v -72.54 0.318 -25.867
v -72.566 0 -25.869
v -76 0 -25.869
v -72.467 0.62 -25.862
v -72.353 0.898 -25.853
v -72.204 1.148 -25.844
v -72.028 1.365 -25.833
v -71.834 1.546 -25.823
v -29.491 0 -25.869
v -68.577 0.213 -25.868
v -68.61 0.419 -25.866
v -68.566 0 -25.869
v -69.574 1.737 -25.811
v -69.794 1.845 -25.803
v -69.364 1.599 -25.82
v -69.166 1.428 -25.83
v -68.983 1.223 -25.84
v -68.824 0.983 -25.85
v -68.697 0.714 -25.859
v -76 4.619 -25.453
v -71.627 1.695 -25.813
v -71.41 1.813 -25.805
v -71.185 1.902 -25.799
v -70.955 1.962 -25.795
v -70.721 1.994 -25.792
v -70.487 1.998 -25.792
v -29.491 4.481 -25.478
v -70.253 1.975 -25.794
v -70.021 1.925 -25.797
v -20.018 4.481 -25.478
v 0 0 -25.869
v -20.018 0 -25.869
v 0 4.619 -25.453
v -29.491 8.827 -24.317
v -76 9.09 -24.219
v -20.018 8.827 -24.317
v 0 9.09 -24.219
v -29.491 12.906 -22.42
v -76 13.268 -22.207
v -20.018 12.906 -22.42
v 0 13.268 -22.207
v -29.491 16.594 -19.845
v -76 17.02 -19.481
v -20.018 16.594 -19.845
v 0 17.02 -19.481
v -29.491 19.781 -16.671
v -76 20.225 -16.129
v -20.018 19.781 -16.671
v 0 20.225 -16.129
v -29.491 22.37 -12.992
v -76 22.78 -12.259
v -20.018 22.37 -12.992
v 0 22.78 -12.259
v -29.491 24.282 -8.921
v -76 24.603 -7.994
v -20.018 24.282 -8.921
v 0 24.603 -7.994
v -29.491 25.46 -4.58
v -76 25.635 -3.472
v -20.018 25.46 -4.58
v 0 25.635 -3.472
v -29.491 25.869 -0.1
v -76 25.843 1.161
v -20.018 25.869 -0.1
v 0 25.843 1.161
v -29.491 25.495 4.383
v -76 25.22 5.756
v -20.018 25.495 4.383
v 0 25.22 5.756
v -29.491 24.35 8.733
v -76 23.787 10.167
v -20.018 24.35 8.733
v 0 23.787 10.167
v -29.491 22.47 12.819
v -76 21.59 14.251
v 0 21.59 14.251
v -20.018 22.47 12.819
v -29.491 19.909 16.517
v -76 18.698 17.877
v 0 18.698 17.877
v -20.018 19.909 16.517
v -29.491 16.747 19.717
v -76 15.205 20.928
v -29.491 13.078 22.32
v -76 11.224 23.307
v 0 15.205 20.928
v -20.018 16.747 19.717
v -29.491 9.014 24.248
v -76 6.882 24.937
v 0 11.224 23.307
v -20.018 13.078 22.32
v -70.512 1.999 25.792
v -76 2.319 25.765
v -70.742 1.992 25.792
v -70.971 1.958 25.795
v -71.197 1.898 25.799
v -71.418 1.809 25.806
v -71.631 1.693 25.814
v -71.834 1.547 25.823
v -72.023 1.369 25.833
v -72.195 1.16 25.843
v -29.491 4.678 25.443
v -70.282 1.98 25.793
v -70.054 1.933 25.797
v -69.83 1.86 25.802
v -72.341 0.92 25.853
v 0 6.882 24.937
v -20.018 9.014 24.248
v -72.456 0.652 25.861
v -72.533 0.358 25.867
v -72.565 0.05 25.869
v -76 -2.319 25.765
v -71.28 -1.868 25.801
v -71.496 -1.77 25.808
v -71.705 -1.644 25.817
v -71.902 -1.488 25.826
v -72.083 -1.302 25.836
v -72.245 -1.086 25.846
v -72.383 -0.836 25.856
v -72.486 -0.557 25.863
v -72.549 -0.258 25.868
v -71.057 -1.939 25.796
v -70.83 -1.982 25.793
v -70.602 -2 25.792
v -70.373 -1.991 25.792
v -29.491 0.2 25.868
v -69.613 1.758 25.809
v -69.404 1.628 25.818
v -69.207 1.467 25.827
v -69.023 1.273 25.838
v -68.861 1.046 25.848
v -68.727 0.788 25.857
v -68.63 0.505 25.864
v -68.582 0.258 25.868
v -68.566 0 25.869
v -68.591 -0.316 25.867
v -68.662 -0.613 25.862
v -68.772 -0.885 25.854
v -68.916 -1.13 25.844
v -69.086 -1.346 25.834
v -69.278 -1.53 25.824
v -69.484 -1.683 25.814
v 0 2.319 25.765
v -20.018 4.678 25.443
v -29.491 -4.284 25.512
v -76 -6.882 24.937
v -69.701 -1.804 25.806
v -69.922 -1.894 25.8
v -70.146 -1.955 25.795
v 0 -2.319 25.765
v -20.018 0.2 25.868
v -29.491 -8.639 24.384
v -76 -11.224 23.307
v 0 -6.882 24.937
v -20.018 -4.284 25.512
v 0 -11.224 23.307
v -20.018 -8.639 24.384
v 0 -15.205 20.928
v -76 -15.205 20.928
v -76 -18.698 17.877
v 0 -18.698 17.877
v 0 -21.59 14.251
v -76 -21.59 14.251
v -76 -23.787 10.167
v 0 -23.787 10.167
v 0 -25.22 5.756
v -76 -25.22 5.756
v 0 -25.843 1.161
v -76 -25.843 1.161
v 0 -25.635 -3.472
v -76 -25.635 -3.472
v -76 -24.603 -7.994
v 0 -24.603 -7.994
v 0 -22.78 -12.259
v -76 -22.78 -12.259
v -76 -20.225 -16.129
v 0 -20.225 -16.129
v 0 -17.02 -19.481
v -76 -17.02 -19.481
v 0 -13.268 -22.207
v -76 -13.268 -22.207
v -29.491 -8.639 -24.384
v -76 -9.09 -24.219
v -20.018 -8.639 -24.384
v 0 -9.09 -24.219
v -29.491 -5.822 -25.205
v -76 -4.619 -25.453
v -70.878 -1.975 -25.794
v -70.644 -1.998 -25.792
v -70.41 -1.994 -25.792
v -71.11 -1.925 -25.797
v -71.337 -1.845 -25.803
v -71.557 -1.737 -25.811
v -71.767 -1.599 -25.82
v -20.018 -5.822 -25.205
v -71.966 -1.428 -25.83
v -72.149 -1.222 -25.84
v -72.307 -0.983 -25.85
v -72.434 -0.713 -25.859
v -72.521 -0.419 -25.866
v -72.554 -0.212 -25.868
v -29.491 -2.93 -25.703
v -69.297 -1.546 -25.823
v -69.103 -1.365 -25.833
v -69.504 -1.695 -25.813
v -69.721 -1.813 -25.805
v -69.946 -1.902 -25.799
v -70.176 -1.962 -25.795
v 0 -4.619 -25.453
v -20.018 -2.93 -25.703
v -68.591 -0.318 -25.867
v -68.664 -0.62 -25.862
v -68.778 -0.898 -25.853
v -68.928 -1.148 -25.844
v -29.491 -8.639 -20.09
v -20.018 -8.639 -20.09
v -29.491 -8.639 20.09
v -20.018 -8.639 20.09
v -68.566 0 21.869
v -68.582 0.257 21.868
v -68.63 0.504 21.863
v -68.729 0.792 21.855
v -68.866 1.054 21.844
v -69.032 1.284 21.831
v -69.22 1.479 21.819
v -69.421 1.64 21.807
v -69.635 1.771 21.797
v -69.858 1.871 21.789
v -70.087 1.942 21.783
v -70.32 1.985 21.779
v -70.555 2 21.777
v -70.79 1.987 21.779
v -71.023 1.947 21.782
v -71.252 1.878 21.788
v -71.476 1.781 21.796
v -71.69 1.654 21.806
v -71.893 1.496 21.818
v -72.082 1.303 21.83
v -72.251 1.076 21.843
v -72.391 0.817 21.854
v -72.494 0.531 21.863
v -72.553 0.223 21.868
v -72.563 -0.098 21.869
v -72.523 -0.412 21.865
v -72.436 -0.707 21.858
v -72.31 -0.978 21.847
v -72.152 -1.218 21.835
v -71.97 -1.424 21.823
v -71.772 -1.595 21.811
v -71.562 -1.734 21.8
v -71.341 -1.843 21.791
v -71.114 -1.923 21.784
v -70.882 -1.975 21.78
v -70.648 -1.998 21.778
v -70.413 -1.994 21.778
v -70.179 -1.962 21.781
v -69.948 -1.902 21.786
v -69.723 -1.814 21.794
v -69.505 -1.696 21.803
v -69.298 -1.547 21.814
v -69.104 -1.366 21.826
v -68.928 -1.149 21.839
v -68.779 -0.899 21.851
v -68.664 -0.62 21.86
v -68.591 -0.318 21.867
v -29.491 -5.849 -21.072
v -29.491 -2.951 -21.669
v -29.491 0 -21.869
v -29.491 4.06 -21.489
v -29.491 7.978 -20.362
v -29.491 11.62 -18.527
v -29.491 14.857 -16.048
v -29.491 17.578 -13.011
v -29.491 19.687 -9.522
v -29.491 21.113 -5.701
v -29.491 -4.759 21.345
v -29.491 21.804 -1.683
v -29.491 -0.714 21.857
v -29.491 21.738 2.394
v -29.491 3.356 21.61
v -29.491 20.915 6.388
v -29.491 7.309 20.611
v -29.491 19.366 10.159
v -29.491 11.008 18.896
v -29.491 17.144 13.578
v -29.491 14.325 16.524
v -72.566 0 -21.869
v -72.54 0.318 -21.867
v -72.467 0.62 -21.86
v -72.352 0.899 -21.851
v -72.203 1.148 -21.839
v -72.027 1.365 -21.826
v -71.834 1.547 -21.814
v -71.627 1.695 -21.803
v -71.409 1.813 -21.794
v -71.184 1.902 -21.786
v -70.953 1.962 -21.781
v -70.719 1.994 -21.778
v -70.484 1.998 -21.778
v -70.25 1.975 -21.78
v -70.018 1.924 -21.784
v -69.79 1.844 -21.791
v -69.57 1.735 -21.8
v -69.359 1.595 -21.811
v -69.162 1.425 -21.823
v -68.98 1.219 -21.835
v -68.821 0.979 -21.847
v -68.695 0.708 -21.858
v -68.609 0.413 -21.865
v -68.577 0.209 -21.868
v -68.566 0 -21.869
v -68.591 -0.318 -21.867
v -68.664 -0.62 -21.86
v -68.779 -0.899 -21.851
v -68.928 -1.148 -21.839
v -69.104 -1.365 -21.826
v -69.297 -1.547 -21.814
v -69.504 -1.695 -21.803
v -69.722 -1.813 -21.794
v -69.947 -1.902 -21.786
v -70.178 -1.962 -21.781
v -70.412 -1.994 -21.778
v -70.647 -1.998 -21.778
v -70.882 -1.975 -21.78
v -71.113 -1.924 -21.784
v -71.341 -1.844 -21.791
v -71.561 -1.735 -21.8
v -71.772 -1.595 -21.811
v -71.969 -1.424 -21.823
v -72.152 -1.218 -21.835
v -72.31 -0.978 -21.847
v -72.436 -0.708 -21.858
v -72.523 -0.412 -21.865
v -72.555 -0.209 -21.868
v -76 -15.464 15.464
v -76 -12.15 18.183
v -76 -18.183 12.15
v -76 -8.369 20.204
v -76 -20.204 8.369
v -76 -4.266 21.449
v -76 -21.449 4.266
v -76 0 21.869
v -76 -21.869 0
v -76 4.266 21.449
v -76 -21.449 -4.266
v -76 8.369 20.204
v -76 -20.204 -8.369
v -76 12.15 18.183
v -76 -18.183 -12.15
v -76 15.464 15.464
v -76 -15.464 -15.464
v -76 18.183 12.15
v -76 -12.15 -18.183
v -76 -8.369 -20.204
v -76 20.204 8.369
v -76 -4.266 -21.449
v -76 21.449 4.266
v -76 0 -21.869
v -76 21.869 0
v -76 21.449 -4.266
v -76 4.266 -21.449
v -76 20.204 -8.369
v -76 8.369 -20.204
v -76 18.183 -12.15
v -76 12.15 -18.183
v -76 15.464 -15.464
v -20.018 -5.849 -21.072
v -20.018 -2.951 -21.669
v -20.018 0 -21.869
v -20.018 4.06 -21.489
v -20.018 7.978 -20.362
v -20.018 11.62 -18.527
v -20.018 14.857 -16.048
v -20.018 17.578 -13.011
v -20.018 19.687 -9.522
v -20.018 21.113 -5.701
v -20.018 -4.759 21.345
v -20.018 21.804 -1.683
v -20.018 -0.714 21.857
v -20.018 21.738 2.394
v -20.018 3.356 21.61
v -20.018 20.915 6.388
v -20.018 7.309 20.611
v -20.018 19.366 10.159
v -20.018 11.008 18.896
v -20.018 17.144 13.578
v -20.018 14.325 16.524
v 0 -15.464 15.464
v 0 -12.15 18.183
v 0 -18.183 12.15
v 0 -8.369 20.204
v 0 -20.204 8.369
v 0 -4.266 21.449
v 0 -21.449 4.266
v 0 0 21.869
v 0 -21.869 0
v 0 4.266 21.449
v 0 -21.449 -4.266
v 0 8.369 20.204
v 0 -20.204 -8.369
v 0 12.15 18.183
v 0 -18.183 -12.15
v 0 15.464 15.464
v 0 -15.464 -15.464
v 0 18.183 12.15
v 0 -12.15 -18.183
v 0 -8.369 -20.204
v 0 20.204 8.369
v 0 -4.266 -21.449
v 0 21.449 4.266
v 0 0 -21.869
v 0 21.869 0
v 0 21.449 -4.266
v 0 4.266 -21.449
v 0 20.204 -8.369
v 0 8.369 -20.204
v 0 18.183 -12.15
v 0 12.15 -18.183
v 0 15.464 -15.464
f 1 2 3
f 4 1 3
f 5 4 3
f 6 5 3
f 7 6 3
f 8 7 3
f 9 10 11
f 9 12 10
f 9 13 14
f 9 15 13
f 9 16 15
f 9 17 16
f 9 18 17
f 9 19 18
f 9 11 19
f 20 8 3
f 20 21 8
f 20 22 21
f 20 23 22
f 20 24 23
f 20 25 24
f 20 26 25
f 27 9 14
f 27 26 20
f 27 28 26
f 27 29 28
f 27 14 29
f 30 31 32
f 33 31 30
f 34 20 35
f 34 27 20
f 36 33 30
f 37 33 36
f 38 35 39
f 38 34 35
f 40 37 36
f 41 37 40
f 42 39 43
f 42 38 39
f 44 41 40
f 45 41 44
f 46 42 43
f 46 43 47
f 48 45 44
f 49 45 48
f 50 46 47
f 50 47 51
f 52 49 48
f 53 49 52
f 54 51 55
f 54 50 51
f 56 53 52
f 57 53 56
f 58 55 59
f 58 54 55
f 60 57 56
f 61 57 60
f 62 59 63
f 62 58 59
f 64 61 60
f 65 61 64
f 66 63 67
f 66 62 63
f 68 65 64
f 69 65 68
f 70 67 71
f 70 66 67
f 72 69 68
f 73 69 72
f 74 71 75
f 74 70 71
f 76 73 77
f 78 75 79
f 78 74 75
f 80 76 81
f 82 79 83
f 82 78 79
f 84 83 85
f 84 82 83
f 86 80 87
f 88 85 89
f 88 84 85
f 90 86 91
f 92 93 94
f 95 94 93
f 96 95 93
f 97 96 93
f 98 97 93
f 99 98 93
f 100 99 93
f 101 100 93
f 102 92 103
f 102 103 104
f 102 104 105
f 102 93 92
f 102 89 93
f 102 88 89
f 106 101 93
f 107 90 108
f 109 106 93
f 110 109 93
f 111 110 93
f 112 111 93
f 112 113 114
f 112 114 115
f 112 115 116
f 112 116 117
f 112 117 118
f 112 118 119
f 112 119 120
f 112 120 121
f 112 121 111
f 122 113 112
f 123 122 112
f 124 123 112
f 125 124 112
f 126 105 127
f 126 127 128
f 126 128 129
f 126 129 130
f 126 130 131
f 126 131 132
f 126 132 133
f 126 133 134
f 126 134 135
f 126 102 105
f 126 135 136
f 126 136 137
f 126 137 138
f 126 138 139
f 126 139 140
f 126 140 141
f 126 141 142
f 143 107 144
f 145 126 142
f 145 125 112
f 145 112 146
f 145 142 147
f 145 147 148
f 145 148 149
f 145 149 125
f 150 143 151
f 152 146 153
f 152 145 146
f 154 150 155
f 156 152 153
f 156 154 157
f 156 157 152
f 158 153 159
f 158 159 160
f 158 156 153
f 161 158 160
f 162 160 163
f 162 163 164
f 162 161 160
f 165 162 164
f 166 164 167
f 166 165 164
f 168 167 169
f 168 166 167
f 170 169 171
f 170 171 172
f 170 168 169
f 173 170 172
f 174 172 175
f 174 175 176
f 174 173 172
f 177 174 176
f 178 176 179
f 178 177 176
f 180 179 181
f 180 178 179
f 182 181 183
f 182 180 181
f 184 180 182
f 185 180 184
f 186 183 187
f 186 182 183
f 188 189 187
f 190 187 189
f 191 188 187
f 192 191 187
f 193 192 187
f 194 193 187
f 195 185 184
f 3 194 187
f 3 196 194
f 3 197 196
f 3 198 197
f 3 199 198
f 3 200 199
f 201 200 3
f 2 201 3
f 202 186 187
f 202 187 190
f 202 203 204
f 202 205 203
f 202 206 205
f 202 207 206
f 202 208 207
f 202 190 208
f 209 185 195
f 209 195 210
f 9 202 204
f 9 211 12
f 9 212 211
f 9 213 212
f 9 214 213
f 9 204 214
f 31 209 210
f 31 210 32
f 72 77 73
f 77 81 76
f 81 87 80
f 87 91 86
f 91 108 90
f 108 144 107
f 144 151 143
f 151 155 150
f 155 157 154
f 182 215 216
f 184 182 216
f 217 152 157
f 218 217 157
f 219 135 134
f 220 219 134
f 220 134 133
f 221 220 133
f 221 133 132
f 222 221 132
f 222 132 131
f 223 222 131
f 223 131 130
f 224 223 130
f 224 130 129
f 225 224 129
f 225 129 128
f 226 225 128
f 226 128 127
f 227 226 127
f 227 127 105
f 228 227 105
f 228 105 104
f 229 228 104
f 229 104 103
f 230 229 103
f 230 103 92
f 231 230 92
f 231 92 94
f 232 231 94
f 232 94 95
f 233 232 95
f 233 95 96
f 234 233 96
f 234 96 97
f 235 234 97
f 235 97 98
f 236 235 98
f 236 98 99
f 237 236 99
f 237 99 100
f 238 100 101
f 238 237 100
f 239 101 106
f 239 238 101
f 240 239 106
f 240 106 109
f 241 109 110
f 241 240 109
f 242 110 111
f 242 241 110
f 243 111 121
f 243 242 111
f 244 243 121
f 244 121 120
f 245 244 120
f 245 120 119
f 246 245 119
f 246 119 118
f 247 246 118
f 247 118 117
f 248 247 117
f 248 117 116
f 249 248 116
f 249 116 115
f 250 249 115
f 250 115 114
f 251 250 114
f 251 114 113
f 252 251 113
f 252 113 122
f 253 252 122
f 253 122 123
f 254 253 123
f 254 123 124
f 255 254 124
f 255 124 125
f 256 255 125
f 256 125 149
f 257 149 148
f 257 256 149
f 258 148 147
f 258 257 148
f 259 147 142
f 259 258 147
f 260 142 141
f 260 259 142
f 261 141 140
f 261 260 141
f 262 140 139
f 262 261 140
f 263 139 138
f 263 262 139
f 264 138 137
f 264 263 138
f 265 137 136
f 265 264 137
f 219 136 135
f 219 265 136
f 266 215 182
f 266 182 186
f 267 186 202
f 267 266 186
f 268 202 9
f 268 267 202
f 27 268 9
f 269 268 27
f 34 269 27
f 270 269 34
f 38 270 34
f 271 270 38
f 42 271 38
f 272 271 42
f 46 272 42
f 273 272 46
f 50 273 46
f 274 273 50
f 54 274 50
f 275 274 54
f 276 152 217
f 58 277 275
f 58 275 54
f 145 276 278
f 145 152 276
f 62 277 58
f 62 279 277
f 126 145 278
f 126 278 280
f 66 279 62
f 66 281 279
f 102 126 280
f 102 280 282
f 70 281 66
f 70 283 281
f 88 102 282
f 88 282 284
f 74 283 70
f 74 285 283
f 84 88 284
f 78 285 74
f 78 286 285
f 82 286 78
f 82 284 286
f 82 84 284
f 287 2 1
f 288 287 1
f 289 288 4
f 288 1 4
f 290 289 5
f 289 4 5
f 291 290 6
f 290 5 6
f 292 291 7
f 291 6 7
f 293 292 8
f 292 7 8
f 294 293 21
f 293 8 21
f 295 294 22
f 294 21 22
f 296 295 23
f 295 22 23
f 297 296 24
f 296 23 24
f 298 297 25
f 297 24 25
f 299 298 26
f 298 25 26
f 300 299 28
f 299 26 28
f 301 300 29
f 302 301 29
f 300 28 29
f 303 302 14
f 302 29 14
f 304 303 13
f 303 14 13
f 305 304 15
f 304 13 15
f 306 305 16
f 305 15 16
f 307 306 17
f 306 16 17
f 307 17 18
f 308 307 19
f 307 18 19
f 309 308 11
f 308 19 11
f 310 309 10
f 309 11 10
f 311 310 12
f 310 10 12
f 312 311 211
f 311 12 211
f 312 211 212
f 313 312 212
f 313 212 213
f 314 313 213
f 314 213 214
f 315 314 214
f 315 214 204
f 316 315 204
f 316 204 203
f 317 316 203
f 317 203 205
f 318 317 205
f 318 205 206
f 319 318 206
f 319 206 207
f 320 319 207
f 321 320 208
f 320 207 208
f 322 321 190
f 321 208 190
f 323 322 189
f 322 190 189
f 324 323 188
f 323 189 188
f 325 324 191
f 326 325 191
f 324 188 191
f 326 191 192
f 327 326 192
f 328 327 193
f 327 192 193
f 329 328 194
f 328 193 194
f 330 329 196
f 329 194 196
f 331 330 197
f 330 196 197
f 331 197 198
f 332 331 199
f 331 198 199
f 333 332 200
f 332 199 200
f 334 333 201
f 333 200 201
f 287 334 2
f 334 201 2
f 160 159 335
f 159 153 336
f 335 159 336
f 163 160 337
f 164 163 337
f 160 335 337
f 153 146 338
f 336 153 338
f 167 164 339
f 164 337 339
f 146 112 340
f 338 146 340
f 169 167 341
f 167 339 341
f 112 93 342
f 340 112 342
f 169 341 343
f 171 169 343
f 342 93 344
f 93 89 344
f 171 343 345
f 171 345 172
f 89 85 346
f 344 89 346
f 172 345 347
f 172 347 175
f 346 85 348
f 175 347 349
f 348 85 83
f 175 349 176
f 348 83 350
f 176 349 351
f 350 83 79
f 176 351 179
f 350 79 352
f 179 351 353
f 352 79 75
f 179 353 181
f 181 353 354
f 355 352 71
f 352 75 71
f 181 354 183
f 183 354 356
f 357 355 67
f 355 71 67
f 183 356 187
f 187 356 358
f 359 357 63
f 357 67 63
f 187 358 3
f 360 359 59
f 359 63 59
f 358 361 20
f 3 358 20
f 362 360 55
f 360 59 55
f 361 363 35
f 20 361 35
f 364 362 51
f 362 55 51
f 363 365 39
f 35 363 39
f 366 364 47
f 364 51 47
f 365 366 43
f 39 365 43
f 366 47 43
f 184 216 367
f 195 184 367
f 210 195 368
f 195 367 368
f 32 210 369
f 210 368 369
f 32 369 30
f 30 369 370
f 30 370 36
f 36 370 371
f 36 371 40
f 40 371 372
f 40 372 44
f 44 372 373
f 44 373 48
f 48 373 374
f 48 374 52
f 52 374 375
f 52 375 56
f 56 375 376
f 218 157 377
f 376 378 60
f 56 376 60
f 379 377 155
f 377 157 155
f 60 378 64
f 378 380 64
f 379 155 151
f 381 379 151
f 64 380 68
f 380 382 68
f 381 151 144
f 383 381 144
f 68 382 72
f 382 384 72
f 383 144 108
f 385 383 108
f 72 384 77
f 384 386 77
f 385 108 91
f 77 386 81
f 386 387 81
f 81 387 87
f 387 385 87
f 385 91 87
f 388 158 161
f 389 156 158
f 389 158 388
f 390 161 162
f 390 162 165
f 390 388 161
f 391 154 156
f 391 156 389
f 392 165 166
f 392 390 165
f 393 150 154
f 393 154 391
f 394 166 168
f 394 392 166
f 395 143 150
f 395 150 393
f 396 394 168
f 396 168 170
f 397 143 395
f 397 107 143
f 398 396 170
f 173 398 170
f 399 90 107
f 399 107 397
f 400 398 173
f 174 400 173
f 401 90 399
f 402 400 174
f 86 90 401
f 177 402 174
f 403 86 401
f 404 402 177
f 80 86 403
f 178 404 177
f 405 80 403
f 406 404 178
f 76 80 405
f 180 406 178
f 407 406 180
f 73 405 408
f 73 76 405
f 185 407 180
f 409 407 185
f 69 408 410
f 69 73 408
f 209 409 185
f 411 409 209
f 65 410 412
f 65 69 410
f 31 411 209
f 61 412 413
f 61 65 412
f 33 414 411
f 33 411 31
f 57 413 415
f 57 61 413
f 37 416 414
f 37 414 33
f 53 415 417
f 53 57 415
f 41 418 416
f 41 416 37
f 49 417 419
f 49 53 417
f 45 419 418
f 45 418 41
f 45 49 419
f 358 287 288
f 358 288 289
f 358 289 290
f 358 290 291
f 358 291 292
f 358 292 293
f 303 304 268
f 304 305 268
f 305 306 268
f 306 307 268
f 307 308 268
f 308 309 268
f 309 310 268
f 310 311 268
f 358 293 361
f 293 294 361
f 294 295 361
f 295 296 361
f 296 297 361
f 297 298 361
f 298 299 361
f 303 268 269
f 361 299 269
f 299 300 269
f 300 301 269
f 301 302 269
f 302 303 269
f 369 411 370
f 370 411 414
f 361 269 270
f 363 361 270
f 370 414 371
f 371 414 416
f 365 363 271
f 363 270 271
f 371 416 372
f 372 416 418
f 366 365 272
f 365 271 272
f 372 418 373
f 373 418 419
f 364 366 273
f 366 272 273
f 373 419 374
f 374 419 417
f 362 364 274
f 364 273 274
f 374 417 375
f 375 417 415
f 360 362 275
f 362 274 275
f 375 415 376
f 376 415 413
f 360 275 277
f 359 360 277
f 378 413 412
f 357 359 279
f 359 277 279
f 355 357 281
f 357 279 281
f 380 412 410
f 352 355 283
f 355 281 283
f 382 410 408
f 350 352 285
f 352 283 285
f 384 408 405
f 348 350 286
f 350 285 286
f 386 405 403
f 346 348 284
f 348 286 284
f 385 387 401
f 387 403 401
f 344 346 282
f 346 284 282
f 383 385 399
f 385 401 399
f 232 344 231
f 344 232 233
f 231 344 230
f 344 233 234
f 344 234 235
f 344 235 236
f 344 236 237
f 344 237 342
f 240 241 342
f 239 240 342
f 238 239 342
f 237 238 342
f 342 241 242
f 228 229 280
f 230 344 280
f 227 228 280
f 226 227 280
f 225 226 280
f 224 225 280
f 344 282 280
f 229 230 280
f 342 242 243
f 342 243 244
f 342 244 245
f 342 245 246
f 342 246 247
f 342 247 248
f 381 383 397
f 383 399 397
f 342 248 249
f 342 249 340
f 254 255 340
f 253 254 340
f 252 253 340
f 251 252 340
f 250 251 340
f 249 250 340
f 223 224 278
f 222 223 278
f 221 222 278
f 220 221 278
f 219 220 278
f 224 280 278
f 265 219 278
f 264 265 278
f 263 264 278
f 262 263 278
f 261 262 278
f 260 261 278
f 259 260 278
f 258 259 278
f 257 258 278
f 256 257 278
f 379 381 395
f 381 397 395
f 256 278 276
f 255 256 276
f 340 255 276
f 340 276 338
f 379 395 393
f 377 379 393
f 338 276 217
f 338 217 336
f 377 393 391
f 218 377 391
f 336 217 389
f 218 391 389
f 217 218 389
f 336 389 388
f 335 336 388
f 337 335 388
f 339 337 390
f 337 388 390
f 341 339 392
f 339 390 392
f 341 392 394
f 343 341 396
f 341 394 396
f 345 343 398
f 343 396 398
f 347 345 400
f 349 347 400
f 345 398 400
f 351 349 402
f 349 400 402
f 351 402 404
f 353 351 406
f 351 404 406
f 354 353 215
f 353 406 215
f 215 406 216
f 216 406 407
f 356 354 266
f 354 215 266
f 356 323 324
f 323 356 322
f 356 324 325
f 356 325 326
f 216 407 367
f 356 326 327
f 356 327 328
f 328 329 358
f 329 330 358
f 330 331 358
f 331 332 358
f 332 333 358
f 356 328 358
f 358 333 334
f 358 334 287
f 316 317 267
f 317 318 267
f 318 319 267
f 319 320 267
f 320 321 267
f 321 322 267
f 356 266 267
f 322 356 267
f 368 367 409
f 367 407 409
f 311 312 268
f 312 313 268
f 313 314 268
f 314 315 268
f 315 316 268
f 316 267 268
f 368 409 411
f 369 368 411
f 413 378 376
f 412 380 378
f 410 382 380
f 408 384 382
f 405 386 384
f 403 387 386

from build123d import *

# Parameters (mm, degrees)
SKETCH1_R               = 25.869040911
SKETCH1_R_2             = 21.869040911
BOSS_EXTRUDE1_DEPTH     = 76
SKETCH2_W               = 9.472494485
SKETCH2_H               = 40.402624636
CUT_EXTRUDE1_DEPTH      = 73.5
CUT_EXTRUDE2_REACH      = 97.509
CUT_EXTRUDE2_END_RADIUS = 21.869040911
SKETCH3_R               = 2
MIRROR1_START           = 21.777395316
MIRROR1_OUTLINE_R       = 2
MIRROR1_DEPTH           = 4.091645695


# Read off the part's stored shape, not the designer's step: Mirror1
with BuildPart() as part:
    # Sketch1 → Boss-Extrude1 (new body)
    with BuildSketch(Plane(origin=(0, 0, 0), x_dir=(0, 0, -1), z_dir=(1, 0, 0))):
        Circle(SKETCH1_R)
        Circle(SKETCH1_R_2, mode=Mode.SUBTRACT)
    extrude(amount=-BOSS_EXTRUDE1_DEPTH)

    # Sketch2 → Cut-Extrude1 (cut, symmetric)
    with BuildSketch(Plane.XY):
        with Locations((-24.754490459, 11.562535947)):
            Rectangle(SKETCH2_W, SKETCH2_H)
    extrude(amount=CUT_EXTRUDE1_DEPTH, both=True, mode=Mode.SUBTRACT)

    # Cut-Extrude2: up to this cylinder (the profile starts outside it)
    cut_extrude2_end = Plane(origin=(-70.565521, 0, 0), z_dir=(1, 0, 0)) * Cylinder(CUT_EXTRUDE2_END_RADIUS, 239.756081822, mode=Mode.PRIVATE)
    # Sketch3 → Cut-Extrude2 (cut, up to the surface)
    with BuildSketch(Plane(origin=(0, 0, -25.869040911), x_dir=(-1, 0, 0), z_dir=(0, 0, -1)), mode=Mode.PRIVATE) as cut_extrude2_sk1:
        with Locations((70.565520642, 0)):
            Circle(SKETCH3_R)
    cut_extrude2_tool1 = extrude(cut_extrude2_sk1.sketch, amount=-CUT_EXTRUDE2_REACH, mode=Mode.PRIVATE) - cut_extrude2_end
    add(cut_extrude2_tool1.solids().sort_by_distance((-70.565521, 0, -25.869041))[0], mode=Mode.SUBTRACT)

    # Mirror1 outline → Mirror1 (cut)
    with BuildSketch(Plane.XY.offset(MIRROR1_START)):
        with Locations((-70.565520642, 0)):
            Circle(MIRROR1_OUTLINE_R)
    extrude(amount=MIRROR1_DEPTH, mode=Mode.SUBTRACT)


solid = part.part
